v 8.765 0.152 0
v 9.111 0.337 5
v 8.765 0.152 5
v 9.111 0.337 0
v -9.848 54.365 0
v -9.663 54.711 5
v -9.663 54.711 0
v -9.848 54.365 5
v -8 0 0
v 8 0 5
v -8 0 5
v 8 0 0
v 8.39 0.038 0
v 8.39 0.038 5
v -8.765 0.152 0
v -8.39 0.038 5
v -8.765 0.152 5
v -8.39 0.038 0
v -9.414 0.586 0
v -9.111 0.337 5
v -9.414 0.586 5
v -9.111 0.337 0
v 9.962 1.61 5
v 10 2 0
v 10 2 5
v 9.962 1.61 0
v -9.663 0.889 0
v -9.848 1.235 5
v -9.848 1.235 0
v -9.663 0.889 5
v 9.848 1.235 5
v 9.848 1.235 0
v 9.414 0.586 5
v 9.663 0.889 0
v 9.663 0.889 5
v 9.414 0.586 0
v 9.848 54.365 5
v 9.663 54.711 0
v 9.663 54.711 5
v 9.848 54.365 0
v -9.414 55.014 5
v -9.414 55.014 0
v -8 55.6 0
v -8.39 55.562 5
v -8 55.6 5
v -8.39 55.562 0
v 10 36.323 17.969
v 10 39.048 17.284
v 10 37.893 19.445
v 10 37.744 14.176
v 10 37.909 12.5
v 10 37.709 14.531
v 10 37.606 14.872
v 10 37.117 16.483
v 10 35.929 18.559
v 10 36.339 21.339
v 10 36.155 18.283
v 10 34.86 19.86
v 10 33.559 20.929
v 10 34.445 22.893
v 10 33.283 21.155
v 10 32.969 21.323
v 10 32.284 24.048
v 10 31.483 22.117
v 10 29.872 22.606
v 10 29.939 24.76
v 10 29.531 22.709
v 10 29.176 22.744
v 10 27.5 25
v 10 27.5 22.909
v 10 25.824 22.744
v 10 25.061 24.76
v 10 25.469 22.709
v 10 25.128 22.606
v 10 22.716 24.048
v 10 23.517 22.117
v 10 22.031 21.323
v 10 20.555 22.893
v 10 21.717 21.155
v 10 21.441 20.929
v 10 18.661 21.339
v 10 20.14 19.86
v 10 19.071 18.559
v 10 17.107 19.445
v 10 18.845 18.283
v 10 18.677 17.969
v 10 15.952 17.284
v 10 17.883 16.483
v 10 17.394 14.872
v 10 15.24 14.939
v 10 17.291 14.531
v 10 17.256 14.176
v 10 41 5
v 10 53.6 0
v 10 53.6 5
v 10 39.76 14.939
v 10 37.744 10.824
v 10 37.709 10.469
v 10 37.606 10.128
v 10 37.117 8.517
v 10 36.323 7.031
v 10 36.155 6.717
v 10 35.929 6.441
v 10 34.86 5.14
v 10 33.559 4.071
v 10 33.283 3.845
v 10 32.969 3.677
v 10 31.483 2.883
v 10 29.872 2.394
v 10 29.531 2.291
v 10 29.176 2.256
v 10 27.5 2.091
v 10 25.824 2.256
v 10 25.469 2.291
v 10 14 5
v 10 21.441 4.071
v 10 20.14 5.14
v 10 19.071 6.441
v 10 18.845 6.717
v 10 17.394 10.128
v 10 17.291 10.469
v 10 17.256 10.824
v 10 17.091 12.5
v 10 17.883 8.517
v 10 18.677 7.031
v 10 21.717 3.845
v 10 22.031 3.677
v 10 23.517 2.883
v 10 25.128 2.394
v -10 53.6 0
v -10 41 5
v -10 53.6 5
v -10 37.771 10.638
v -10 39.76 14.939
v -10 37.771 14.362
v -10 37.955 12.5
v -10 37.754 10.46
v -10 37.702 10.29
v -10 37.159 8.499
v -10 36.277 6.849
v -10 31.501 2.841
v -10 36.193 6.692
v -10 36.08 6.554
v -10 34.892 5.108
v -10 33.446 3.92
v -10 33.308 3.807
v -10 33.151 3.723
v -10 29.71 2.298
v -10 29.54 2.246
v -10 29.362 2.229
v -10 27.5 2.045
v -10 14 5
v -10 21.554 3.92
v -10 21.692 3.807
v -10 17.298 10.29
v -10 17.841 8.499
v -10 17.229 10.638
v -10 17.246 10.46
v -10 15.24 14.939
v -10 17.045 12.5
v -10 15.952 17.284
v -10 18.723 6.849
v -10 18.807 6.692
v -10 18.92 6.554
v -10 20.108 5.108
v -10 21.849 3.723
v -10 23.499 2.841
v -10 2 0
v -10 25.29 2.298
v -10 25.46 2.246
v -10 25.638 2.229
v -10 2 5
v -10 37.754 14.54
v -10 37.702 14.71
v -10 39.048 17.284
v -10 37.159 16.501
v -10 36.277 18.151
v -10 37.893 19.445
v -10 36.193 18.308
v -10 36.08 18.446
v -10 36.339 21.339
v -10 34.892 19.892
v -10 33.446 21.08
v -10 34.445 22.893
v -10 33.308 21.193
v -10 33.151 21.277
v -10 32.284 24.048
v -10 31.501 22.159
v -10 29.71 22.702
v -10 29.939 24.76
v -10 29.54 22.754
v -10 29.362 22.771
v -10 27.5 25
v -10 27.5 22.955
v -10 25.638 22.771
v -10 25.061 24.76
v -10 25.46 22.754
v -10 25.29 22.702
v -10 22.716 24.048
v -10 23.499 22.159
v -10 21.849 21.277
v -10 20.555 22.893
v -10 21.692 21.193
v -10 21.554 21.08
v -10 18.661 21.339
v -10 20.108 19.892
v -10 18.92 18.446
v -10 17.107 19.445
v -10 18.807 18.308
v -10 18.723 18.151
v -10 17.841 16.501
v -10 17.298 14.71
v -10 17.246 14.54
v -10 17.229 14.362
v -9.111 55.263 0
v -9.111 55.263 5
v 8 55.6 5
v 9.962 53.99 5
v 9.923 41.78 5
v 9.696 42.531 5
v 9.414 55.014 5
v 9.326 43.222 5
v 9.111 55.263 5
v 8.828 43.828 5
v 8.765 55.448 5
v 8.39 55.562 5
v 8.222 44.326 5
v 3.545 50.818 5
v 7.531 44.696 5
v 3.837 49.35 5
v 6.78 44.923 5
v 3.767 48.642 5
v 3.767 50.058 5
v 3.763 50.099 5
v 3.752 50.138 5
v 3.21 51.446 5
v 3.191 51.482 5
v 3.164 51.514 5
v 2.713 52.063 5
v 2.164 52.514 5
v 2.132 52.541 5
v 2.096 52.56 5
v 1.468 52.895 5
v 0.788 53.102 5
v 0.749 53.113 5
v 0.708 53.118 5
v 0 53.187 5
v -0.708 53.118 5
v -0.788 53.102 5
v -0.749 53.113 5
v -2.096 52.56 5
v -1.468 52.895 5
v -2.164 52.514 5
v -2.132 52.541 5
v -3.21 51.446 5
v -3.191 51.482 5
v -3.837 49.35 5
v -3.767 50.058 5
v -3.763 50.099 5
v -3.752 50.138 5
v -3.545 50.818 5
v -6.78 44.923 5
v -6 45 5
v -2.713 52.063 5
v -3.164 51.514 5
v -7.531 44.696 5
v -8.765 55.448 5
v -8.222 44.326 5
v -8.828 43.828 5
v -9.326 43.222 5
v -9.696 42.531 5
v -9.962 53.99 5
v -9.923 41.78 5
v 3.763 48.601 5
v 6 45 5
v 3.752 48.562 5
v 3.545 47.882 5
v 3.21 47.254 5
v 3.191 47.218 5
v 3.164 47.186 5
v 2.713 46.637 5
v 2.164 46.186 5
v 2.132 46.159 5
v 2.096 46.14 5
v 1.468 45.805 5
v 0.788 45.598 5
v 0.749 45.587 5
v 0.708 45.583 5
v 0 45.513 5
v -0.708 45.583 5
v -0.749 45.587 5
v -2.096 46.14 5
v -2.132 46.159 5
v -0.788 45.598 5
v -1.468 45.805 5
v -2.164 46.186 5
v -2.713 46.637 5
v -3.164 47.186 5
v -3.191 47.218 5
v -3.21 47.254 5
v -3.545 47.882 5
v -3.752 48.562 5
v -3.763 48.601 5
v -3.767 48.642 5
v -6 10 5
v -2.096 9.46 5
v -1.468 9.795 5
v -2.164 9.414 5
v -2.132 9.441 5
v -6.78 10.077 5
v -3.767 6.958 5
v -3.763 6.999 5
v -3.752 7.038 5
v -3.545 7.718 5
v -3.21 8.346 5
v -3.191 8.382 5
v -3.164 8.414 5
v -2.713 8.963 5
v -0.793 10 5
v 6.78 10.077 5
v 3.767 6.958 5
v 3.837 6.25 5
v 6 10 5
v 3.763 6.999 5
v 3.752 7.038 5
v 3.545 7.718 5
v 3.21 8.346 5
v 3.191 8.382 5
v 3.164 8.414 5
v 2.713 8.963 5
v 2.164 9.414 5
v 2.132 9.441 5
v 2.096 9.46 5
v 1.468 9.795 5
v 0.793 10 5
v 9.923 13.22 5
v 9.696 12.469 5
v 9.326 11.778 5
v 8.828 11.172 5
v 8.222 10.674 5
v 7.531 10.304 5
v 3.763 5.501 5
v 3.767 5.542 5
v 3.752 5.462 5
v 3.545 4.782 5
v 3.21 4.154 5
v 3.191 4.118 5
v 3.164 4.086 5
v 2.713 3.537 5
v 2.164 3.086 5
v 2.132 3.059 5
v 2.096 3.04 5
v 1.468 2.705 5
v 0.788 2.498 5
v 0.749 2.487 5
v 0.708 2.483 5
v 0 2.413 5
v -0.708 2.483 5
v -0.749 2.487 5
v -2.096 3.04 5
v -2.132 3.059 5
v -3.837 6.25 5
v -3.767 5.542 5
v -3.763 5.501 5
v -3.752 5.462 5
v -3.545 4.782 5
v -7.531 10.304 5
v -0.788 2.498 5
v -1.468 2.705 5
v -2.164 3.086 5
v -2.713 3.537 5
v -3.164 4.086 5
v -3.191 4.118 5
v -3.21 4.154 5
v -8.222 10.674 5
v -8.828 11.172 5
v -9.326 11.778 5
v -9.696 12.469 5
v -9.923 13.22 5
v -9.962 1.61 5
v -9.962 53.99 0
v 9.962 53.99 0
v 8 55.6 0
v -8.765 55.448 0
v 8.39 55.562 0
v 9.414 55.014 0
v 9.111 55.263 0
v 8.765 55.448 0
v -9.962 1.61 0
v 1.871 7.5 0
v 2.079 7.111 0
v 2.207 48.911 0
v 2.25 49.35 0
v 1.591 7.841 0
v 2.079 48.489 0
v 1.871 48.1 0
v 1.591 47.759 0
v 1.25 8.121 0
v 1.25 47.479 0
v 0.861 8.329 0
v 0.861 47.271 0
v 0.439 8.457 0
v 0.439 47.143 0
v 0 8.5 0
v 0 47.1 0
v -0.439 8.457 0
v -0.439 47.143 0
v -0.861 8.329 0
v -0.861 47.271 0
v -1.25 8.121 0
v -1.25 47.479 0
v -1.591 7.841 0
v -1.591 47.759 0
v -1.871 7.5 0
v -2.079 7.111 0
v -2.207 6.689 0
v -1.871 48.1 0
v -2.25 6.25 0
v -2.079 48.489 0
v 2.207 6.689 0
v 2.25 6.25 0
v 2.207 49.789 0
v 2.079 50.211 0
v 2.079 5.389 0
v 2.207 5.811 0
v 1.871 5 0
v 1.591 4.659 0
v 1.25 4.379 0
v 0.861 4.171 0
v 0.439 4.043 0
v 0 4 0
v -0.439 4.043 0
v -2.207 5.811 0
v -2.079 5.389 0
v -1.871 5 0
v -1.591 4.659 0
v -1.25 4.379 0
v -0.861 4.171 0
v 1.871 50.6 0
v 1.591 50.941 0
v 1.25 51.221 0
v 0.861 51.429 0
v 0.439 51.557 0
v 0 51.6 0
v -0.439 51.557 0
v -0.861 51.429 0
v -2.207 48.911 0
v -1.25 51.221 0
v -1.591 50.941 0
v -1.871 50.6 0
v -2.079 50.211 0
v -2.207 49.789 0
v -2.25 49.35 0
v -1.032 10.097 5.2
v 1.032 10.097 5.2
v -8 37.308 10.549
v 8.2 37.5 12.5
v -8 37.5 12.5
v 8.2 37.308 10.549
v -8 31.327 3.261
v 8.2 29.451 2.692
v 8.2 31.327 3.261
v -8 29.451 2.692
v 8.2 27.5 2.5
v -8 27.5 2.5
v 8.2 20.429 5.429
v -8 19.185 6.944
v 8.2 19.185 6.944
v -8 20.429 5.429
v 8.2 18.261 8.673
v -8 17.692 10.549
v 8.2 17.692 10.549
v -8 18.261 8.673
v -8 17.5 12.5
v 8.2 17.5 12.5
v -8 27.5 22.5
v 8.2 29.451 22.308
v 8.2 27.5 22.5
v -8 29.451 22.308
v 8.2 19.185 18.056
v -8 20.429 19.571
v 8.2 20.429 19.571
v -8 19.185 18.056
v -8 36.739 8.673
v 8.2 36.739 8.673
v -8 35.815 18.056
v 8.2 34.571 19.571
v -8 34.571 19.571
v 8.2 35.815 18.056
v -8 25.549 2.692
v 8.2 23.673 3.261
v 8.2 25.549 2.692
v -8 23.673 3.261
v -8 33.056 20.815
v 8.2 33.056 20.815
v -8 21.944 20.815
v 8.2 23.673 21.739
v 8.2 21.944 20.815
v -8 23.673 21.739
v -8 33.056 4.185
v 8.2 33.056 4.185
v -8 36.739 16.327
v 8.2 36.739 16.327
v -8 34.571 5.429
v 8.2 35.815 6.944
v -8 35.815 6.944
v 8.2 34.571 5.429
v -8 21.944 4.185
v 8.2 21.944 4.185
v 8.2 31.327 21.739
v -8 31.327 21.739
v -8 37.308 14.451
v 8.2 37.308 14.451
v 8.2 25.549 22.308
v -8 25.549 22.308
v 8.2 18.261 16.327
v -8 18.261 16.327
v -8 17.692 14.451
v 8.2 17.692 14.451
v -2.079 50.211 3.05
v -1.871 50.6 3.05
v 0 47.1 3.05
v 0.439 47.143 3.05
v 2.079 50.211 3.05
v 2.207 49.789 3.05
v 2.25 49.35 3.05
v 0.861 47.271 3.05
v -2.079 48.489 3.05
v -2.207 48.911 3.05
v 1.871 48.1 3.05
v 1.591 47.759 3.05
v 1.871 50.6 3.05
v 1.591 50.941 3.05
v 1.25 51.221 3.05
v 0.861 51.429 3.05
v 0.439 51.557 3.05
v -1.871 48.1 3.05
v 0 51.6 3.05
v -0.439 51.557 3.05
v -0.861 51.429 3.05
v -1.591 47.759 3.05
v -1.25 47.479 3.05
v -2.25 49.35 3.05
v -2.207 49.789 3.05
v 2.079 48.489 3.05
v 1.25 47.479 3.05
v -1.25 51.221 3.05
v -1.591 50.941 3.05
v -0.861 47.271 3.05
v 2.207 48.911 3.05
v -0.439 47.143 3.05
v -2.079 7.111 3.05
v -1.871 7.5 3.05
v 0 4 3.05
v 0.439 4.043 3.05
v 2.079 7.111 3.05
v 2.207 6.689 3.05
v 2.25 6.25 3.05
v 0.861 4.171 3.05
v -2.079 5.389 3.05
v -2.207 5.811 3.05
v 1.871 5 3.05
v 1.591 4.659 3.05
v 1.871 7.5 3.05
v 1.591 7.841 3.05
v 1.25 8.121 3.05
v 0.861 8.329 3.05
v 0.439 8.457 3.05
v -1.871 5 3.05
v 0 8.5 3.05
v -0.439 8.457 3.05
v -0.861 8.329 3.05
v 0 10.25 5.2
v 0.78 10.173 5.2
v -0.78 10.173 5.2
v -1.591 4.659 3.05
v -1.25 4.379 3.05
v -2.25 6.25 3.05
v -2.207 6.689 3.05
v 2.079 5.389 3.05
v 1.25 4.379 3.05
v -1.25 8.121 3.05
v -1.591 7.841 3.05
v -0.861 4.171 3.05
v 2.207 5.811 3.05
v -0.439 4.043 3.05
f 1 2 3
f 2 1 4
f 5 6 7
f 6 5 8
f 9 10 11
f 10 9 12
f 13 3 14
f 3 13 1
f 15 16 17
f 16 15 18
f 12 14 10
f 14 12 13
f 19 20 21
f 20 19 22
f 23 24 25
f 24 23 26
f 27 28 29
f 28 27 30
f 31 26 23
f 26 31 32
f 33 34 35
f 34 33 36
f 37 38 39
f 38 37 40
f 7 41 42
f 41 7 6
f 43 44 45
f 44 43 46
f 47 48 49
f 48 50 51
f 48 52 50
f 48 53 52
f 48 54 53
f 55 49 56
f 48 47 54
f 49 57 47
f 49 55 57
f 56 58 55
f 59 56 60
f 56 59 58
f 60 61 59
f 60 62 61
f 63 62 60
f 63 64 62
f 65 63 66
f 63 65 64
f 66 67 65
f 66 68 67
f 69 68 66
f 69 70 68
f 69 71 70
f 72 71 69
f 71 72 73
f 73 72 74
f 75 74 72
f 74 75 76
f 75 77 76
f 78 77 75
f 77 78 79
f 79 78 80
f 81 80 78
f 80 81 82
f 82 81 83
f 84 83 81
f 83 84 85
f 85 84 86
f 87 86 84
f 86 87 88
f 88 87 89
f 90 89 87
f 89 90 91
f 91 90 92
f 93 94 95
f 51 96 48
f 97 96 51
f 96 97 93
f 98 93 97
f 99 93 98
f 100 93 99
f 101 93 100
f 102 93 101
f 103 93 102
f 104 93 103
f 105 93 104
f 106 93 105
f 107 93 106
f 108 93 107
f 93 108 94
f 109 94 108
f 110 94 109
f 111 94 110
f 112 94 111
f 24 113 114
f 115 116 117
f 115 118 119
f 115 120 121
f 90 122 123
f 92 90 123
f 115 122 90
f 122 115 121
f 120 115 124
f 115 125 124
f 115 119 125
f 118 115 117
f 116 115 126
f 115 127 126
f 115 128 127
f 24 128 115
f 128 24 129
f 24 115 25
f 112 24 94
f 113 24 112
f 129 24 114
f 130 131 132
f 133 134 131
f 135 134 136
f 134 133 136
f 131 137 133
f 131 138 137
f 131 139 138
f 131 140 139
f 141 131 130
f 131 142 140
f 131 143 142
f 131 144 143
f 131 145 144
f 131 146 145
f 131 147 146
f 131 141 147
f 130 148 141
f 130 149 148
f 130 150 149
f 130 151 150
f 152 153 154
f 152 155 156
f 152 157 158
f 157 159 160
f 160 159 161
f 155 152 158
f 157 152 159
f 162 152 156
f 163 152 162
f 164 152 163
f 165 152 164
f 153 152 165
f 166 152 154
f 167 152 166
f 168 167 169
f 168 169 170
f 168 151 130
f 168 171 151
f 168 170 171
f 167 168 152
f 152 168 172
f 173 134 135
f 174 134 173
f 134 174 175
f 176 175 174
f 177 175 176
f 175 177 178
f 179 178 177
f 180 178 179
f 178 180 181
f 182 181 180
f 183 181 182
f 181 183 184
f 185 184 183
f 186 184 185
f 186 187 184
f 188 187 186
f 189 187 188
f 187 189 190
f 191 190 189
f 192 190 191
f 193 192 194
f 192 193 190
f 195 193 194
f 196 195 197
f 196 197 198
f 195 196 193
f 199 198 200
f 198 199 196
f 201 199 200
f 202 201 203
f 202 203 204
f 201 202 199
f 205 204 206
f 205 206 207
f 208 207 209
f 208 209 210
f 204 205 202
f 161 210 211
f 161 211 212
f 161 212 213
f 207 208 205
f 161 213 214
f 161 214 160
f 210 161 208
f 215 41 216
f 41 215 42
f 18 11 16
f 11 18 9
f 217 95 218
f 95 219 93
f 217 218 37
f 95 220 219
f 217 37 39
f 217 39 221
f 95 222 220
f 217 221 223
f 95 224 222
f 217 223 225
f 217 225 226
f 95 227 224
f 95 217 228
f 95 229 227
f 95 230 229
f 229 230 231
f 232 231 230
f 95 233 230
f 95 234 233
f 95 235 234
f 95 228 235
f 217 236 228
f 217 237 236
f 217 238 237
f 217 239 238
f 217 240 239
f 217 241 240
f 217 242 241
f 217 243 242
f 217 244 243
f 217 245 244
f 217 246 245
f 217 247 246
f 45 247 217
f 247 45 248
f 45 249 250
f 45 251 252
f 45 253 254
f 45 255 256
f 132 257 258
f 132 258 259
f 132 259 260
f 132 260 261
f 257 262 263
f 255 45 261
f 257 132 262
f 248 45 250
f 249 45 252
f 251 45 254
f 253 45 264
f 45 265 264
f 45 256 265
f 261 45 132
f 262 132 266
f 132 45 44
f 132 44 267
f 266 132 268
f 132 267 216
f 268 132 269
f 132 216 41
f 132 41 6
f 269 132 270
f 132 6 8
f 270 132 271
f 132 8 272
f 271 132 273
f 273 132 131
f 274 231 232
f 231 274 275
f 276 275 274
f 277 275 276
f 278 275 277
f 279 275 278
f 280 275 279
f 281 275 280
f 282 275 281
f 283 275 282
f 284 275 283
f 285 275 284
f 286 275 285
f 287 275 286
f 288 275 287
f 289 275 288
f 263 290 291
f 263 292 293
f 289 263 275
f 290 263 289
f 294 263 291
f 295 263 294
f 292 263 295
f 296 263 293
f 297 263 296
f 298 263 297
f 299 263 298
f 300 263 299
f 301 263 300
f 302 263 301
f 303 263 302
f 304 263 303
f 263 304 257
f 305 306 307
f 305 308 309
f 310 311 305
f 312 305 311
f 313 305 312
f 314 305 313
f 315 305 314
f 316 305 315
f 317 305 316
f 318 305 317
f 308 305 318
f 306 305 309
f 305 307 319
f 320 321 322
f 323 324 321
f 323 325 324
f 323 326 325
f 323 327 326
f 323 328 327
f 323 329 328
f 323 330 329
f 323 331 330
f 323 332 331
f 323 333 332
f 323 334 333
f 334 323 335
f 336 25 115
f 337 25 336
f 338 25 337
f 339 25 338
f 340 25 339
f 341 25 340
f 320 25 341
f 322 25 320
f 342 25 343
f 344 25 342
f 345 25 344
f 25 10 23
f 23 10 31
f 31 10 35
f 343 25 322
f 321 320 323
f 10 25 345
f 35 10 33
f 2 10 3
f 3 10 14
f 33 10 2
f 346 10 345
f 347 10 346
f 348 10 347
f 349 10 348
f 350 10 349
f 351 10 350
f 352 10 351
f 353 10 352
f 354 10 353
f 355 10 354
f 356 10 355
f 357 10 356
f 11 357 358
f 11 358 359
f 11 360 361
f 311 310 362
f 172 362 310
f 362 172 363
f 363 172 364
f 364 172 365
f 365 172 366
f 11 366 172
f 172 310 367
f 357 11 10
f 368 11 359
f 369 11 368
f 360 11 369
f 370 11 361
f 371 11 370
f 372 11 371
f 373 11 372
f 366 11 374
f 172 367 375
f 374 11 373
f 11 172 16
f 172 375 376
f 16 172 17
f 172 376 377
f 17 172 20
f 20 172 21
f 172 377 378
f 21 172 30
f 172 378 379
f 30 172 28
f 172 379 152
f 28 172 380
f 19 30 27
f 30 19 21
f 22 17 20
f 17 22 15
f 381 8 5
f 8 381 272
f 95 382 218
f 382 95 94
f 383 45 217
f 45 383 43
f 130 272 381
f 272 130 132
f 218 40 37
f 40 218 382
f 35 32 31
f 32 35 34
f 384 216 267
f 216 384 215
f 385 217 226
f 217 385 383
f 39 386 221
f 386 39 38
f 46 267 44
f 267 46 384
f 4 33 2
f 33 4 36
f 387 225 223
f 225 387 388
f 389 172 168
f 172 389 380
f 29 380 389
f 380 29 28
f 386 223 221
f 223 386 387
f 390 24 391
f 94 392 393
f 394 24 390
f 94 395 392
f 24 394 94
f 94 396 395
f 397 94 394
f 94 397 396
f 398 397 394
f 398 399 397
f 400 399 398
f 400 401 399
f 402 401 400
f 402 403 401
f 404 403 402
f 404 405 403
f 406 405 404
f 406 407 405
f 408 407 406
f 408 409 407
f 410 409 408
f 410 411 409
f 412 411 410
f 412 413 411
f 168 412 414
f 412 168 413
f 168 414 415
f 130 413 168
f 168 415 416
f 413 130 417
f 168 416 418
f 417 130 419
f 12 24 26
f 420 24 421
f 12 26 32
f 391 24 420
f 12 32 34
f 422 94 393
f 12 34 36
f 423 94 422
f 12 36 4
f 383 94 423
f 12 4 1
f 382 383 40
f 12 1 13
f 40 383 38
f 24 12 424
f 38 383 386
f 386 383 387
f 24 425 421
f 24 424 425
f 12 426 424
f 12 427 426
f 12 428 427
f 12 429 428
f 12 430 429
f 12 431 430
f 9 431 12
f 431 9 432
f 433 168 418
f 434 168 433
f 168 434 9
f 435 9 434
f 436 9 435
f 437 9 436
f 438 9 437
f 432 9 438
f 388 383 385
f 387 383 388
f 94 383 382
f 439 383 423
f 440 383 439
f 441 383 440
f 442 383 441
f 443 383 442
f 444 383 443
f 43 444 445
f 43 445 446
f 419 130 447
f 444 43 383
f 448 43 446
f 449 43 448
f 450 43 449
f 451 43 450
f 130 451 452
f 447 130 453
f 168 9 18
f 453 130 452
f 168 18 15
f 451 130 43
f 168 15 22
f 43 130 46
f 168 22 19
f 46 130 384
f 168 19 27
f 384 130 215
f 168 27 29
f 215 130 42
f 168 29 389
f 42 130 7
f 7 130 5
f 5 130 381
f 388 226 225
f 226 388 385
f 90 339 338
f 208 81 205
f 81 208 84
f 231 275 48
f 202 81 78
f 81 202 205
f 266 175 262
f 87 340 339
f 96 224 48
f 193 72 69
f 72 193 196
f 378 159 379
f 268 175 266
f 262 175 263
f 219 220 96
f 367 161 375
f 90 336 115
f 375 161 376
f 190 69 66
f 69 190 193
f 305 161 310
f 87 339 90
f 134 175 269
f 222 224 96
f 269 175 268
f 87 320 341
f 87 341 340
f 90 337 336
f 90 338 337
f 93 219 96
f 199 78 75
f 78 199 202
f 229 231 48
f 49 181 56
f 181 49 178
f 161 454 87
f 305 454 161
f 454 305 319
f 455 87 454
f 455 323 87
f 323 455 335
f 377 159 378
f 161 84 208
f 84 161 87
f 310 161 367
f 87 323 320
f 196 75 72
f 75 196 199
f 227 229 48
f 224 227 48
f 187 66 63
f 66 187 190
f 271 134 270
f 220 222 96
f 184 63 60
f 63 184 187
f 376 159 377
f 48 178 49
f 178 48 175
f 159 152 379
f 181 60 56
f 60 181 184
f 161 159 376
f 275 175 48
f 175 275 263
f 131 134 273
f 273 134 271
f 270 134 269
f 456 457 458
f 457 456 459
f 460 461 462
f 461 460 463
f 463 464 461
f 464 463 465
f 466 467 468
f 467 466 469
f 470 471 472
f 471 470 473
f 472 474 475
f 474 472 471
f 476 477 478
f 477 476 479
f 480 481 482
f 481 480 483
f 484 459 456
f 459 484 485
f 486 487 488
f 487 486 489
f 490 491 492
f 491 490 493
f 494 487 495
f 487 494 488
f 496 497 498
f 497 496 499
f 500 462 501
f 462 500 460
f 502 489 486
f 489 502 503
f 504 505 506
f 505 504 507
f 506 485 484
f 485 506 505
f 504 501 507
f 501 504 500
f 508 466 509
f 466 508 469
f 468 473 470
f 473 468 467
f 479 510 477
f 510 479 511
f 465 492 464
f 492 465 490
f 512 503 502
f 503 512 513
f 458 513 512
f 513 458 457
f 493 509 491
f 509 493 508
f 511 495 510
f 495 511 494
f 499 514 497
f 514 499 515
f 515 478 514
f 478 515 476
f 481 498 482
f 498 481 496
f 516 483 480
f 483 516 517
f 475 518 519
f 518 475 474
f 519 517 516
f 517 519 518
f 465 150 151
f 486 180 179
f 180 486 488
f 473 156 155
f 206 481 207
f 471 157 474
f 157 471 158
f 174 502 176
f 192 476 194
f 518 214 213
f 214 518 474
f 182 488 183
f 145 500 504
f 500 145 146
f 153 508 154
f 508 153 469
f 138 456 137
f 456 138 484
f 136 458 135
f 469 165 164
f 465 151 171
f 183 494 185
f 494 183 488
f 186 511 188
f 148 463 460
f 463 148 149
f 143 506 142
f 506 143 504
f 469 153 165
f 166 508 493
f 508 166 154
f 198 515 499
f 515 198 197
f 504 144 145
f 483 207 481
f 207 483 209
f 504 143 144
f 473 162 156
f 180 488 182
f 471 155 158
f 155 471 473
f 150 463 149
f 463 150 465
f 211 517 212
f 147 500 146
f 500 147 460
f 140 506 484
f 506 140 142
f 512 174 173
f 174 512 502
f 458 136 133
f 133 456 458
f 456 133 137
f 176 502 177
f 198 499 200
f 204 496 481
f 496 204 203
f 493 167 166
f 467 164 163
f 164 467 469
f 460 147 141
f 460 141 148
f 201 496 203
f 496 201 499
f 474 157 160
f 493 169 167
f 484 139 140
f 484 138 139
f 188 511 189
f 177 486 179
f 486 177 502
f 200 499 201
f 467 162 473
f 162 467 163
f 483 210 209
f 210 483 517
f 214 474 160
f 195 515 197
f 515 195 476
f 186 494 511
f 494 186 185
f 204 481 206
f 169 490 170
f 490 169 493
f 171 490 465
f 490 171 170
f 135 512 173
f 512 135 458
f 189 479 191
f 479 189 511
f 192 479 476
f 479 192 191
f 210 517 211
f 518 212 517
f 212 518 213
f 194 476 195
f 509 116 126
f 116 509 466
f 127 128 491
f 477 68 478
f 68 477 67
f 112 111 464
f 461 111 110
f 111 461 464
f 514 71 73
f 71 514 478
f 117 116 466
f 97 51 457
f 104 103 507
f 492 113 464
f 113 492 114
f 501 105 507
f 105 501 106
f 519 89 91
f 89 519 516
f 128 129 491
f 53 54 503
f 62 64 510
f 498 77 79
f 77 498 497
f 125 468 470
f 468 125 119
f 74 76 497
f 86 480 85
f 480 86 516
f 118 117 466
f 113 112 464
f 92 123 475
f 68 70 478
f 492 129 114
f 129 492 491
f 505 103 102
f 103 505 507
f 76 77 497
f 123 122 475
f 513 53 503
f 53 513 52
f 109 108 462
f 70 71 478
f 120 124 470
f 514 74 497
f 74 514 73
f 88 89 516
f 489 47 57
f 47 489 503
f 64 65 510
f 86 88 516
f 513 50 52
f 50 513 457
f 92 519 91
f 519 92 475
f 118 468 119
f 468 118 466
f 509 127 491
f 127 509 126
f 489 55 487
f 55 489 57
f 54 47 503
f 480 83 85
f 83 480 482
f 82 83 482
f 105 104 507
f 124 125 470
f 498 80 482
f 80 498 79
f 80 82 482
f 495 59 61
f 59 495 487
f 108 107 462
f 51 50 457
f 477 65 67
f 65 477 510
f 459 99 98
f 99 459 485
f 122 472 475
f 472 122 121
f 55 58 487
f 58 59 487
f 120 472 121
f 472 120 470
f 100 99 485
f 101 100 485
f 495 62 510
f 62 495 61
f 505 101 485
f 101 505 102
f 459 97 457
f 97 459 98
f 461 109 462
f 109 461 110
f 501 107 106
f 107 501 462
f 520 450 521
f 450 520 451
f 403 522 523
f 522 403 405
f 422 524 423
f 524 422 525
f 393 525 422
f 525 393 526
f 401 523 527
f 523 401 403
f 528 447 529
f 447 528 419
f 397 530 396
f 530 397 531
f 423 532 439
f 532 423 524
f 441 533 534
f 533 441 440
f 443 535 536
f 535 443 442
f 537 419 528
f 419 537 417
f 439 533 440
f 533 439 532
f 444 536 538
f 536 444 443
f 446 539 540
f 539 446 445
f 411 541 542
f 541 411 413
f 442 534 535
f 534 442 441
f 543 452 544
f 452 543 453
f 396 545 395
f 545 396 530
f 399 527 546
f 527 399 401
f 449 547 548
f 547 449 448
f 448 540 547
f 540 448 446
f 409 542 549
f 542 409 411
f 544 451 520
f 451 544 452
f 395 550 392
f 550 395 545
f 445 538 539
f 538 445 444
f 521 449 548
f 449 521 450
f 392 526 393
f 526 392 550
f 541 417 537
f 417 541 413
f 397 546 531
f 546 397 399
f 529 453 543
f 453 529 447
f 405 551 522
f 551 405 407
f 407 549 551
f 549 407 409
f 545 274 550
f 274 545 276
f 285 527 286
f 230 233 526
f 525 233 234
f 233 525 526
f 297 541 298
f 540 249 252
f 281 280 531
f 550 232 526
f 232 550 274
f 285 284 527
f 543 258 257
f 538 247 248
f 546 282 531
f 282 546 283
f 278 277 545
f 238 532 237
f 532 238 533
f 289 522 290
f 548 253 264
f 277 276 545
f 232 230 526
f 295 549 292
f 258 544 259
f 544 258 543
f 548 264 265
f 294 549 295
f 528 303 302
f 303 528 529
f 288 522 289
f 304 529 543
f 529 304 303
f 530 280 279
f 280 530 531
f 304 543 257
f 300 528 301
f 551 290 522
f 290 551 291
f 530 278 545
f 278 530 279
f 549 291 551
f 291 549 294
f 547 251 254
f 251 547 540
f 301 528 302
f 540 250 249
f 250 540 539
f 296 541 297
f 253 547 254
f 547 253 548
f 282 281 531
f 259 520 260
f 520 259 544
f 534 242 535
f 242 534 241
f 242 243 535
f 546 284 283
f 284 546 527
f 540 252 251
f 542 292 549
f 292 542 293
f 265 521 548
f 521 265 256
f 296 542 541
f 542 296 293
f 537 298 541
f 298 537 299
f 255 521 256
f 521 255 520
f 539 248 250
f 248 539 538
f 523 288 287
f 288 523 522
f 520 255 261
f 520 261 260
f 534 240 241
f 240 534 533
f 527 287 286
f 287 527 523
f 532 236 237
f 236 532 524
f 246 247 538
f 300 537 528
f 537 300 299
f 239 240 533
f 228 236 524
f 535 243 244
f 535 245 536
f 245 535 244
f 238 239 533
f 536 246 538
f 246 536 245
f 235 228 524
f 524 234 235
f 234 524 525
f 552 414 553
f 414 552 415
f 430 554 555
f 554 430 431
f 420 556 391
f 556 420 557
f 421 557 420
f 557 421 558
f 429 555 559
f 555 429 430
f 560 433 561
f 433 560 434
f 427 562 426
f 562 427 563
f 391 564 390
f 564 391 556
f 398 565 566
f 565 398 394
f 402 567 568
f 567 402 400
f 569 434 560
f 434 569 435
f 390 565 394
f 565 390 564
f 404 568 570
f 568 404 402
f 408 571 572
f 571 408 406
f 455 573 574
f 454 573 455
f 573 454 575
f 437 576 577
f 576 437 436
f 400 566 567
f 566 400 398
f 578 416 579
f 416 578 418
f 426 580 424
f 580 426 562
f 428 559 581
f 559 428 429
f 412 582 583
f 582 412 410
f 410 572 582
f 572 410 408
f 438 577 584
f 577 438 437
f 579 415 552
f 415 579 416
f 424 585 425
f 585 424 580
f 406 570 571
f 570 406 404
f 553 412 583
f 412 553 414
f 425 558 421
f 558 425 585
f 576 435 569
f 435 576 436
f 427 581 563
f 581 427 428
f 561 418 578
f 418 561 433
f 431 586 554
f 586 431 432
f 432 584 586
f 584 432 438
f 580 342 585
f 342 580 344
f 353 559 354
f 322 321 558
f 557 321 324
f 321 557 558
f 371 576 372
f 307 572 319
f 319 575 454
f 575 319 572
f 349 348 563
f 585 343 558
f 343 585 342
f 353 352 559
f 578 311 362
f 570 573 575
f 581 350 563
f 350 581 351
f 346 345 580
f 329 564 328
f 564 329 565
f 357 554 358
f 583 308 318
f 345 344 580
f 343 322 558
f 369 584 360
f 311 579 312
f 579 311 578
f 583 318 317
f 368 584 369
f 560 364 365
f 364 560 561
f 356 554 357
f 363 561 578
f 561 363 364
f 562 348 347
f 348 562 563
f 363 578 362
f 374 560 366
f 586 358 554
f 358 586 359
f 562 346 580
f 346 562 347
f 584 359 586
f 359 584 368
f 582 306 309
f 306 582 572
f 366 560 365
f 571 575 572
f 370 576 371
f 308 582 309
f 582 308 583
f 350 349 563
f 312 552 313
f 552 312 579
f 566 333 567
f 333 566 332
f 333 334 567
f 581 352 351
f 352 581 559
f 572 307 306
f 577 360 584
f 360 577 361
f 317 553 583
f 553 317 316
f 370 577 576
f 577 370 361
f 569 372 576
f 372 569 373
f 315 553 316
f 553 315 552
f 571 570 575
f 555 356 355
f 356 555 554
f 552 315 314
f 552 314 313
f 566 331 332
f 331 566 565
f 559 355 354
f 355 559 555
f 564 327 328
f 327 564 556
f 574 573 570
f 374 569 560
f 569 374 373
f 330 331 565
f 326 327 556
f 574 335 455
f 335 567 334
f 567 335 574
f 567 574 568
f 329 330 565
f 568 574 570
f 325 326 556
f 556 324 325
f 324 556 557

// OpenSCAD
// file: phgUtils_v1.scad
/*
 *  OpenSCAD utilities 
 *
 *  by Ph.Gregoire AKA Greg Ware <greg.ware@laposte.net>
 *  
 *  Includes:
 *   - shorter macro modules to get a cube or cylinder with translation and rotation
 *   -  Due to some display defects in OpenSCAD preview (F5), some can use a small epsilon 
 *      so as to cut protruding apertures in solids
 *   - useful modules to build rounded corner cubes, triangle (wedges), etc
 *
 * History
 * Date         Author      Description
 * 2017/??/??   Ph.Gregoire Initial version(s)
 * 2018/07/18   Ph.Gregoire Rework for X5S corners
 *
 *  This work is licensed under the 
 *  Creative Commons Attribution 3.0 Unported License.
 *  To view a copy of this license, visit
 *    http://creativecommons.org/licenses/by/3.0/ 
 *  or send a letter to 
 *    Creative Commons, PO Box 1866, Mountain View, CA 94042, USA.
*/

// Thickness of supports for apertures
$_SUPPORT_THK=0.2;

// Cylinders $fn default
$_FN_CYL=32;
function GET_FN_CYL()=$_FN_CYL;

// Epsilon
$_EPSILON=0.2;
function GET_EPSILON()=$_EPSILON;

/* Simple translation */
module tr(dx,dy=0,dz=0) {
    translate([dx,dy,dz]) children();
}

/* Z-translation */
module trz(dz) {
    translate([0,0,dz]) children();
}

/* Simple rotation */
module rot(ax,ay=0,az=0) {
    rotate([ax,ay,az]) children();
}

/* Translate and rotate children */
module trrot(tx,ty,tz,ax,ay=0,az=0) {
    translate([tx,ty,tz]) rotate([ax,ay,az]) children();
}

/* translated cube */
module trcube(tx,ty,tz,dx,dy,dz,center=false) {
    translate([tx,ty,tz]) cube(size=[dx,dy,dz],center=center);
}

/* translated cube with epsilons along Z */
module trcube_eps(tx,ty,tz,dx,dy,dz) {
    translate([tx,ty,tz-$_EPSILON]) cube([dx,dy,dz+2*$_EPSILON]);
}

/* translated cylinder */
module trcyl(tx,ty,tz,d,h,center=false,fn=$_FN_CYL) {
	translate([tx,ty,tz]) cylinder(d=d,h=h,center=center,$fn=fn);
}

/* translated cone */
module trcone(tx,ty,tz,d1,d2,h,center=false,fn=$_FN_CYL) {
	translate([tx,ty,tz]) cylinder(d1=d1,d2=d2,h=h,center=center,$fn=fn);
}

/* cylinder with epsilon along Z axis */
module cyl_eps(d,h,center=false,fn=$_FN_CYL) {
    cylinder(d=d,h=h+2*$_EPSILON,center=center,$fn=fn);
}

/* translated cylinder with epsilon along height (Z) */
module trcyl_eps(tx,ty,tz,d,h,center=false,fn=$_FN_CYL) {
    translate([tx,ty,tz-$_EPSILON]) cyl_eps(d,h,center=center,fn=fn);
}

module trrotcyl(tx,ty,tz,ax,ay,az,d,h,center=false,fn=$_FN_CYL) {
	trrot(tx,ty,tz,ax,ay,az) cylinder(d=d,h=h,center=center,$fn=fn);
}

module tube(dint,dout,h,center,fn=$_FN_CYL) {
    difference() {
        cylinder(d=dout,h=h,center=center,$fn=fn);
        cylinder(d=dint,h=h,center=center,$fn=fn);
    }
}

module trrottube(tx,ty,tz,ax,ay,az,dout,dint,h,center=false,fn=$_FN_CYL) {
	trrot(tx,ty,tz,ax,ay,az) tube(dout=dout,dint=dint,h=h,center=center,$fn=fn);
}

/* translated and rotated cylinder with epsilon along height (Z) */
module trrotcyl_eps(tx,ty,tz,ax,ay,az,d,h,center=false,fn=$_FN_CYL) {
    trrot(tx,ty,tz,ax,ay,az) translate([0,0,-$_EPSILON]) cylinder(d=d,h=h+2*$_EPSILON,center=center,$fn=fn);
}

/* translated and rotated cube */
module trrotcube(tx,ty,tz,ax,ay,az,dx,dy,dz,center=false) {
    trrot(tx,ty,tz,ax,ay,az) cube([dx,dy,dz],center=center);
}

/* rotated and translated cube */
module rottrcube(tx,ty,tz,ax,ay,az,dx,dy,dz,center=false) {
    rotate([ax,ay,az]) tr(tx,ty,tz) cube([dx,dy,dz],center=center);
}

/* Translated rotate cube with diff children (in cube referential) */
module trrotcube_diff(tx,ty,tz,ax,ay,az,dx,dy,dz) {
    trrot(tx,ty,tz,ax,ay,az) difference() {
        cube([dx,dy,dz]);
        children();
    }
}

/* Box with apertures cut out from children */
module boxWithApertures(w,l,h,t) {
    // Bottom
    trcube(-w/2-t,-l/2-t,0,w+2*t,l+2*t,t);

    // sides
    for(s=[0:3]) {
        L=w*((s+1)%2)+l*(s%2)+2*t;
        P=l*((s+1)%2)+w*(s%2);
        
        rotate([0,0,s*90]) {
            translate([-L/2,P/2,t]) {
                difference() {
                    cube([L,t,h]);
                    // aperture
                    if($children>s) {
                        translate([thk,thk,0]) rotate([90,0,0]) children(s);
                    }
                }
            }
        }
    }

}

/* Make a support: remove a thin support layer from a flat shape */
module supportDiff(thk) {
    difference() {
        children(0);
        translate([0,0,thk/2]) {
            linear_extrude(height=$_SUPPORT_THK) projection() children(0);
        }
    }
}

/* Lateral vents 
    n: number of vents
    h: height of vent and vent spacing
    l: horizontal length of vent
    x: horizontal x offset of vent
    z: vertical offset of first vent
    t: thickness of panel
*/
module vents(n,h,l,x,z,t) {
    for(v=[0:n-1]) {
        trcube_eps(x,z+2*v*h,0,l,h,t);
    }
}

/* Fan vent 
    w: width of panel
    dz: height of center of fan
    df: diameter of fan
    dh: diameter of hub
    fs: Number of fan spokes
    t: thickness of panel
*/
module fanvent(w,dz,df,dh,fs,t) {
    difference() {
        // External
        trcyl_eps(w/2,dz,0,df,t);
        
        // central hub
        trcyl_eps(w/2,dz,0,dh,t);
        
        // spokes
        translate([w/2,dz,0]) {
            for(a=[0:fs-1]) {
                rotate([0,0,180+a*(360/fs)]) trcube_eps(-t/2,0,0,t,df,t);
            }
        }
    }
}
/* Fan mounting holes
    w: Width of panel
    dz: height of center of fan
    wfh: width of fan holes
    dfh: diameter of fan holes
    t: thickness of panel
*/
module fanholes(w,dz,wfh,dfh,t) {
    for(x=[-1,1]) {
        for(y=[-1,1]) {
            trcyl_eps(w/2+wfh/2*x,dz+wfh/2*y,0,dfh,t);
        }
    }
}

/* Position children in one corner of box, using a centered box */
module cornerPos(w,l,h,x,y,center=true) {
    translate([center?x*w/2:(x+1)*w/2,center?y*l/2:(y+1)*l/2,h]) {
        if(x==-1 && y==-1) children();
        if(x==1 && y==-1) rotate([0,0,90]) children();
        if(x==1 && y==1) rotate([0,0,180]) children();
        if(x==-1 && y==1) rotate([0,0,270]) children();
    }
}

/* Position children at each 4 corners of centered cube */ 
module cornersPos(w,l,h=0,center=true) {
 for(x=[-1,1]) {
        for(y=[-1,1]) {
            cornerPos(w,l,h,x,y,center=center) children();
        }
    }
}


/* Quarter Cone */
module quarterCone(r1,r2,h) {
    intersection() {
        cylinder(r1=r2,r2=r1,h=h);
        cube([r1>r2?r1:r2,r1>r2?r1:r2,h]);
    }
}

module quarterCyl(r,h) {
    intersection() {
        cylinder(r=r,h=h,$fn=$_FN_CYL);
        cube([r,r,h]);
    }
}

/* Corner rounding */
module champfer(rounding,h) {
    difference() {
        translate([-$_EPSILON,-$_EPSILON,-$_EPSILON])
            cube([rounding+$_EPSILON,rounding+$_EPSILON,h+2*$_EPSILON]);
        translate([rounding,rounding])
            cylinder(r=rounding,h=h);
    }
}

/* Triangle by extrusion. the a parameter is the rotation angle */
module triangle(dx,dy,h,a=0) {
    if(a<0) triangle(dx,dy,h,a=a+360);
    else {
        a=a%360;
        linear_extrude(height=h) {
            if(a<90) polygon(points=[[0,0],[dx,0],[0,dy],[0,0]]);
            else if(a<180) polygon(points=[[0,0],[dx,dy],[dx,0],[0,0]]);
            else if(a<270) polygon(points=[[dx,dy],[0,dy],[dx,0],[dx,dy]]);
            else if(a<360) polygon(points=[[0,0],[dx,dy],[0,dy],[0,0]]);
        }
    }
}

module roundedFlatBox(dx,dy,h,r,center=false) {
    translate([center?r-dx/2:r,center?r-dy/2:r]) 
    linear_extrude(height=h)
    offset(r=r)
    square([dx-2*r,dy-2*r]);
}

module roundedBoundingBox(dx,dy,dz,rx,ry,rz) {
    minkowski() {
        trcube(rx,ry,rz,dx-2*rx,dy-2*ry,dz-2*rz);
        r=max(rx,ry,rz);
        scale([rx/r,ry/r,rz/r]) sphere(r);
    }
}

test();

module test() {
    //triangle(30,20,10,270);
    //quarterCyl(5,10);
    //champfer(5,10);
    roundedBoundingBox(40,50,20,5,10,7);
}
// main file
/*
 *
 +--------------------------------------------------------------------------
 * History
 * Date       Version Author      Description
 * 2019/02/11  v1     Ph.Gregoire Initial version
 +-------------------------------------------------------------------------
 *
 *  This work is licensed under the 
 *  Creative Commons Attribution 3.0 Unported License.
 *  To view a copy of this license, visit
 *    http://creativecommons.org/licenses/by/3.0/ 
 *  or send a letter to 
 *    Creative Commons, PO Box 1866, Mountain View, CA 94042, USA.
*/

use <phgUtils_v1.scad>

// Thickness
thk=5;

// Depth of champfer
champDepth=2;

// Rounding radius
rnd=2;


// squashing width
squash=thk;

// Screw shaft and head diameters
screwDiam=4.5;
screwHead=8;

// Tolerance...
_EPSILON=GET_EPSILON();

module _screwHole() {
    cyl_eps(screwDiam,thk);
    trcone(0,0,thk-(screwHead-screwDiam)/2,screwDiam,screwHead,(screwHead-screwDiam)/2+_EPSILON*2);
}

module _screwHoles(dx,dy) {
    // Screw holes and seats
    screwOff=screwDiam+screwHead;
    
    trz(-_EPSILON) 
    if(dx-screwOff<screwHead) {
        // One hole along x
        for(s=[1,-1]) tr(0,s*(dy-screwOff)/2) _screwHole();
    } else cornersPos(dx-screwOff,dy-screwOff) _screwHole();
}

function bw(diam)=diam+thk+2*squash;
function zOff(diam)=diam/2+thk/2;

module _hullcyl(length,diam,rotz=0,halfTapper=false) {
    bw=bw(diam);
    rot(0,0,rotz) hull() {
        tr(0,-bw/2) if(halfTapper)
            intersection() {
                tr(-rnd*2) roundedFlatBox(length+rnd*2,bw,thk,rnd*2);
                cube([length,bw,thk]);
            }
        else roundedFlatBox(length,bw,thk,rnd*2);
        trrotcyl(0,0,zOff(diam),0,90,0,diam+thk,length);
    }
}

module _hull() {
    #union() children();
}

module _hullify(h,dz) {
    hull() {
        trz(-dz)
        linear_extrude(height=h) 
        offset(r=squash)
        projection() children();
        children();
    }
}

/* Champfered cylinder */
module _cylchamp(length,diam,rotz=0) {
    rot(rotz,90) {
        // Inner tube
        cyl_eps(diam,length-champDepth+_EPSILON);
        
        // Champfer
        trcone(0,0,length-champDepth,diam,diam+champDepth/2,thk+_EPSILON);
    }
}

/* Repeat children with translation from an array */
module repeatTr(offsets,i=0) {
    translate(offsets[i]) {
        children();
        if(i+1<len(offsets)) {
            repeatTr(offsets,i+1) children();
        }
    }
}

function ix(arr,i)=(i<0)?(len(arr)-1):i;

/* Adds items from an array */
function sigma(arr,i=-1,step=1) = (len(arr)<=0)?0:(arr[ix(arr,i)]+((ix(arr,i)<step)?0:sigma(arr,ix(arr,i)-step,step)));

/* Generate multiple parallel supports 
    diamSpacings contains an array of spacings followed by diameter
*/
module multipleStraight(dx,diams,spacings=[],_eps=0) {
    diams=(len(diams)==undef)?[diams]:diams;
    diamsMax=len(diams)-1;
    spacings=(len(spacings)==undef)?[for(i=[0:diamsMax]) spacings]:spacings;
    
    // Offsets to position screw holes and rounding of base plate
    screwOff=screwDiam+screwHead;
    
    
    plateInnerBorder=(diams[0]+_eps)/2+thk+screwOff;
    plateOuterBorder=(diams[diamsMax]+_eps)/2+thk+screwOff;
    
    dy=plateInnerBorder+sigma(spacings)+plateOuterBorder;
    
    difference() {
        union() {
            // support
            tr(0,dy/2) roundedFlatBox(dx,dy,thk,rnd,center=true);
            
            for(iD=[0:diamsMax]) {
                // support and outer tube
                sy=plateInnerBorder+((iD==0)?0:sigma(spacings,iD-1));
                tr(-dx/2,sy) _hullcyl(dx,diams[iD]+_eps);
            }
        }
        for(iD=[0:diamsMax]) {
            diam=diams[iD]+_eps;
            sy=plateInnerBorder+((iD==0)?0:sigma(spacings,iD-1));
            trrot(-_EPSILON-dx/2,sy,zOff(diam),0,90,0) {
                // Inner tube
                cyl_eps(diam,dx);
                
                // Champfers
                cylinder(d1=diam+champDepth/2,d2=diam,champDepth+_EPSILON);
                trcone(0,0,dx-champDepth+2*_EPSILON,diam,diam+champDepth/2,champDepth+_EPSILON);
            }
        }
        
        tr(0,dy/2) _screwHoles(dx,dy);
    }

}

module straightSupport(dx,dy,diam,_eps=0) difference() {
    multipleStraight(dx,dy,[dy/2,diam],_eps);
}

module cornerSupport(dx,dy,diam) difference() {
    bw=bw(diam);
    union() {
        // support
        roundedFlatBox(dx,dy,thk,rnd,center=true);
        
        // support and outer tube
        _hullcyl(dx/2,diam);
        _hullcyl(dy/2,diam,90);
        
        // Central sphere
        hull() {
            tr(-bw/2,-bw/2) roundedFlatBox(bw,bw,thk,rnd*2);
            trz(zOff(diam)) sphere(d=diam+thk);
        }
    }

    trz(zOff(diam)) {
        _cylchamp(dx/2,diam);
        _cylchamp(dy/2,diam,-90);
        sphere(d=diam);
    }
    
    _screwHoles(dx,dy);
}

module quartTorus(r,d) {
    intersection() {
        rot(0,0,180) trcube(0,0,-d/2,r+d/2,r+d/2,d);
        rotate_extrude(convexity = 2) {
            tr(r) circle(d=d);
        }
    }
}

/* Square with one rounded corner */
module roundedSquare(d,h) {
    cylinder(d=d,h=h);
    trcube(-d/2,0,0,d/2,d/2,h);
    trcube(0,-d/2,0,d/2,d/2,h);
    trcube(0,0,0,d/2,d/2,h);
}

module roundedRect(dx,dy,r,h) {
    union() {
        intersection() {
            trcyl(dx-r,dy-r,h/2,d=r*2,h=h,center=true);
            trcube(dx-r/2,dy-r/2,h/2,r,r,h,center=true);
        }
        trcube(0,dy-r,0,dx-r,r,h);
        trcube(dx-r,0,0,r,dy-r,h);
        trcube(0,0,0,dx-r,dy-r,h);
    }
}

module roundSupport(dx,dy,diam) {
    // Offset of the torus (torus radius)
    offT=diam/2+2*thk;
    screwOff=screwDiam+screwHead;
    rOff=dx/2-screwOff;
    dOff=(dx-screwOff)*2;
    difference() {
        union() {
            // support
            intersection() {
                roundedFlatBox(dx,dy,thk,rnd,center=true);                
                tr(rOff,rOff,0) roundedSquare(dOff,thk);
            }
            
            // support and outer tube
            tr(offT) _hullcyl(dx/2-offT,diam,0,true);
            tr(0,offT) _hullcyl(dy/2-offT,diam,90,true);
            
            // Rounding
            tr(offT,offT,zOff(diam)) _hullify(thk,diam/2+thk/2) quartTorus(offT,diam+thk);
        }

        trz(zOff(diam)) {
            // Hole
            tr(offT-_EPSILON) _cylchamp(dx/2-offT+_EPSILON,diam);
            tr(0,offT-_EPSILON) _cylchamp(dy/2-offT+_EPSILON,diam,-90);
            
            // Rounding hole
            tr(offT,offT) quartTorus(offT,diam);
        }
    
        _screwHoles(dx,dy);
        tr(rOff-(dOff-screwOff)*sqrt(2)/4,rOff-(dOff-screwOff)*sqrt(2)/4,-_EPSILON) _screwHole();
    }
}

module roundHull(inlet,outlet,thk,diam) {
    offT=diam/2+2*thk;
    
    // inlet
    tr(offT) _hullcyl(inlet-offT,diam,0,true);
    
    // Rounding
    tr(offT,offT,zOff(diam)) _hullify(thk,diam/2+thk/2) quartTorus(offT,diam+thk);

    // outlet    
    tr(0,offT) _hullcyl(outlet-offT,diam,90,true);
}

module roundHole(inlet,outlet,thk,diam) {
    trz(zOff(diam)) {
        offT=diam/2+2*thk;
        // inlet
        tr(offT-_EPSILON) _cylchamp(inlet-offT+_EPSILON,diam);
        
        // rounding
        tr(offT,offT) quartTorus(offT,diam);

        // outlet
        tr(0,offT-_EPSILON) _cylchamp(outlet-offT+_EPSILON,diam,-90);
    } 
}

module multipleRound(diams,spacingsIn=[],spacingsOut=[],_eps=0) {
    diams=(len(diams)==undef)?[diams]:diams;
    
    // Offsets to position screw holes and rounding of base plate
    screwOff=screwDiam+screwHead;
    diamsMax=len(diams)-1;
    
    plateInnerBorder=(diams[0]+_eps)/2+thk+screwOff;
    plateOuterBorder=(diams[diamsMax]+_eps)/2+thk+screwOff;
    
    dx=plateInnerBorder+sigma(spacingsOut)+plateOuterBorder;
    dy=plateInnerBorder+sigma(spacingsIn)+plateOuterBorder;
       
    rOff=dx/2-screwOff;
    dOff=(dx-screwOff)*2;
    torusOuterDiam=3*diams[diamsMax]/2+thk+squash;
    echo("Size: dx=",dx," dy=",dy);
    
    difference() {
        union() {
            // rounded base plate
            intersection() {
                roundedFlatBox(dx,dy,thk,rnd,center=true);
                rot(0,0,180) tr(-dx/2,-dy/2) roundedRect(dx,dy,plateOuterBorder+torusOuterDiam/2,thk);
            }
            for(iD=[0:diamsMax]) {
                // outer tube
                oS=plateInnerBorder+((iD==0)?0:sigma(spacingsOut,iD-1));
                iS=plateInnerBorder+((iD==0)?0:sigma(spacingsIn,iD-1));
                tr(dx/2-oS,dy/2-iS) {
                    roundHull(oS,iS,thk,diams[iD]+_eps);
                }
            }
        }
        union() {
            for(iD=[0:diamsMax]) {
                // inner tube hole
                oS=plateInnerBorder+((iD==0)?0:sigma(spacingsOut,iD-1));
                iS=plateInnerBorder+((iD==0)?0:sigma(spacingsIn,iD-1));
                tr(dx/2-oS,dy/2-iS) {
                    roundHole(oS,iS,thk,diams[iD]+_eps);
                }
            }
            
            // Screw holes
            //_screwHoles(dx,dy);
            screwPos=(screwDiam+screwHead)/2;
            
            tr(dx/2-screwPos,dy/2-screwPos,-_EPSILON) _screwHole();
            tr(-(dx/2-screwPos),dy/2-screwPos,-_EPSILON) _screwHole();
            tr(dx/2-screwPos,-(dy/2-screwPos),-_EPSILON) _screwHole();
            
            // 
            r=torusOuterDiam/2+thk*2+screwPos*2;
            r2=r/sqrt(2);
            
            torx=(plateOuterBorder+torusOuterDiam/2)-dx/2;
            tory=(plateOuterBorder+torusOuterDiam/2)-dy/2;
            tr(torx-r2,tory-r2,-_EPSILON) _screwHole();
            //trcyl(torx,tory,0,r*2,100);
        }
    }
}

/* Set details accuracy */
$fn=GET_FN_CYL();
//$fn=8;

/* Generate a short (2 holes) straight support */
//tr(40) 
//straightSupport(20,60,20+_EPSILON*2);
multipleStraight(20,20,_EPSILON*3);

/* Generate a long (4 holes) straight support */
//tr(40) 
//straightSupport(40,60,20+_EPSILON*2);
//multipleStraight(40,20,_EPSILON*3);

/* Generate a corner support */
//tr(-40) 
//cornerSupport(80,60,20+1);

/* Generate a rounded support */
//roundSupport(60,60,20+_EPSILON*2);

/* Generate supports for 4 tubes of diams 16,20,20,20 spaced by 25mm */
//multipleStraight(20,[20,20,20,16],25,_EPSILON*3);

/* Support that matches the 20-20-20-26/45-45-20 rounded one */
//multipleStraight(20,[20,20,20,16],[45,45,20],_EPSILON*3);

/* Rounded support */
//multipleRound([20,20,20,16],[25,25,25],[45,45,20],_EPSILON*2);
//multipleRound(20,_eps=_EPSILON*2);
